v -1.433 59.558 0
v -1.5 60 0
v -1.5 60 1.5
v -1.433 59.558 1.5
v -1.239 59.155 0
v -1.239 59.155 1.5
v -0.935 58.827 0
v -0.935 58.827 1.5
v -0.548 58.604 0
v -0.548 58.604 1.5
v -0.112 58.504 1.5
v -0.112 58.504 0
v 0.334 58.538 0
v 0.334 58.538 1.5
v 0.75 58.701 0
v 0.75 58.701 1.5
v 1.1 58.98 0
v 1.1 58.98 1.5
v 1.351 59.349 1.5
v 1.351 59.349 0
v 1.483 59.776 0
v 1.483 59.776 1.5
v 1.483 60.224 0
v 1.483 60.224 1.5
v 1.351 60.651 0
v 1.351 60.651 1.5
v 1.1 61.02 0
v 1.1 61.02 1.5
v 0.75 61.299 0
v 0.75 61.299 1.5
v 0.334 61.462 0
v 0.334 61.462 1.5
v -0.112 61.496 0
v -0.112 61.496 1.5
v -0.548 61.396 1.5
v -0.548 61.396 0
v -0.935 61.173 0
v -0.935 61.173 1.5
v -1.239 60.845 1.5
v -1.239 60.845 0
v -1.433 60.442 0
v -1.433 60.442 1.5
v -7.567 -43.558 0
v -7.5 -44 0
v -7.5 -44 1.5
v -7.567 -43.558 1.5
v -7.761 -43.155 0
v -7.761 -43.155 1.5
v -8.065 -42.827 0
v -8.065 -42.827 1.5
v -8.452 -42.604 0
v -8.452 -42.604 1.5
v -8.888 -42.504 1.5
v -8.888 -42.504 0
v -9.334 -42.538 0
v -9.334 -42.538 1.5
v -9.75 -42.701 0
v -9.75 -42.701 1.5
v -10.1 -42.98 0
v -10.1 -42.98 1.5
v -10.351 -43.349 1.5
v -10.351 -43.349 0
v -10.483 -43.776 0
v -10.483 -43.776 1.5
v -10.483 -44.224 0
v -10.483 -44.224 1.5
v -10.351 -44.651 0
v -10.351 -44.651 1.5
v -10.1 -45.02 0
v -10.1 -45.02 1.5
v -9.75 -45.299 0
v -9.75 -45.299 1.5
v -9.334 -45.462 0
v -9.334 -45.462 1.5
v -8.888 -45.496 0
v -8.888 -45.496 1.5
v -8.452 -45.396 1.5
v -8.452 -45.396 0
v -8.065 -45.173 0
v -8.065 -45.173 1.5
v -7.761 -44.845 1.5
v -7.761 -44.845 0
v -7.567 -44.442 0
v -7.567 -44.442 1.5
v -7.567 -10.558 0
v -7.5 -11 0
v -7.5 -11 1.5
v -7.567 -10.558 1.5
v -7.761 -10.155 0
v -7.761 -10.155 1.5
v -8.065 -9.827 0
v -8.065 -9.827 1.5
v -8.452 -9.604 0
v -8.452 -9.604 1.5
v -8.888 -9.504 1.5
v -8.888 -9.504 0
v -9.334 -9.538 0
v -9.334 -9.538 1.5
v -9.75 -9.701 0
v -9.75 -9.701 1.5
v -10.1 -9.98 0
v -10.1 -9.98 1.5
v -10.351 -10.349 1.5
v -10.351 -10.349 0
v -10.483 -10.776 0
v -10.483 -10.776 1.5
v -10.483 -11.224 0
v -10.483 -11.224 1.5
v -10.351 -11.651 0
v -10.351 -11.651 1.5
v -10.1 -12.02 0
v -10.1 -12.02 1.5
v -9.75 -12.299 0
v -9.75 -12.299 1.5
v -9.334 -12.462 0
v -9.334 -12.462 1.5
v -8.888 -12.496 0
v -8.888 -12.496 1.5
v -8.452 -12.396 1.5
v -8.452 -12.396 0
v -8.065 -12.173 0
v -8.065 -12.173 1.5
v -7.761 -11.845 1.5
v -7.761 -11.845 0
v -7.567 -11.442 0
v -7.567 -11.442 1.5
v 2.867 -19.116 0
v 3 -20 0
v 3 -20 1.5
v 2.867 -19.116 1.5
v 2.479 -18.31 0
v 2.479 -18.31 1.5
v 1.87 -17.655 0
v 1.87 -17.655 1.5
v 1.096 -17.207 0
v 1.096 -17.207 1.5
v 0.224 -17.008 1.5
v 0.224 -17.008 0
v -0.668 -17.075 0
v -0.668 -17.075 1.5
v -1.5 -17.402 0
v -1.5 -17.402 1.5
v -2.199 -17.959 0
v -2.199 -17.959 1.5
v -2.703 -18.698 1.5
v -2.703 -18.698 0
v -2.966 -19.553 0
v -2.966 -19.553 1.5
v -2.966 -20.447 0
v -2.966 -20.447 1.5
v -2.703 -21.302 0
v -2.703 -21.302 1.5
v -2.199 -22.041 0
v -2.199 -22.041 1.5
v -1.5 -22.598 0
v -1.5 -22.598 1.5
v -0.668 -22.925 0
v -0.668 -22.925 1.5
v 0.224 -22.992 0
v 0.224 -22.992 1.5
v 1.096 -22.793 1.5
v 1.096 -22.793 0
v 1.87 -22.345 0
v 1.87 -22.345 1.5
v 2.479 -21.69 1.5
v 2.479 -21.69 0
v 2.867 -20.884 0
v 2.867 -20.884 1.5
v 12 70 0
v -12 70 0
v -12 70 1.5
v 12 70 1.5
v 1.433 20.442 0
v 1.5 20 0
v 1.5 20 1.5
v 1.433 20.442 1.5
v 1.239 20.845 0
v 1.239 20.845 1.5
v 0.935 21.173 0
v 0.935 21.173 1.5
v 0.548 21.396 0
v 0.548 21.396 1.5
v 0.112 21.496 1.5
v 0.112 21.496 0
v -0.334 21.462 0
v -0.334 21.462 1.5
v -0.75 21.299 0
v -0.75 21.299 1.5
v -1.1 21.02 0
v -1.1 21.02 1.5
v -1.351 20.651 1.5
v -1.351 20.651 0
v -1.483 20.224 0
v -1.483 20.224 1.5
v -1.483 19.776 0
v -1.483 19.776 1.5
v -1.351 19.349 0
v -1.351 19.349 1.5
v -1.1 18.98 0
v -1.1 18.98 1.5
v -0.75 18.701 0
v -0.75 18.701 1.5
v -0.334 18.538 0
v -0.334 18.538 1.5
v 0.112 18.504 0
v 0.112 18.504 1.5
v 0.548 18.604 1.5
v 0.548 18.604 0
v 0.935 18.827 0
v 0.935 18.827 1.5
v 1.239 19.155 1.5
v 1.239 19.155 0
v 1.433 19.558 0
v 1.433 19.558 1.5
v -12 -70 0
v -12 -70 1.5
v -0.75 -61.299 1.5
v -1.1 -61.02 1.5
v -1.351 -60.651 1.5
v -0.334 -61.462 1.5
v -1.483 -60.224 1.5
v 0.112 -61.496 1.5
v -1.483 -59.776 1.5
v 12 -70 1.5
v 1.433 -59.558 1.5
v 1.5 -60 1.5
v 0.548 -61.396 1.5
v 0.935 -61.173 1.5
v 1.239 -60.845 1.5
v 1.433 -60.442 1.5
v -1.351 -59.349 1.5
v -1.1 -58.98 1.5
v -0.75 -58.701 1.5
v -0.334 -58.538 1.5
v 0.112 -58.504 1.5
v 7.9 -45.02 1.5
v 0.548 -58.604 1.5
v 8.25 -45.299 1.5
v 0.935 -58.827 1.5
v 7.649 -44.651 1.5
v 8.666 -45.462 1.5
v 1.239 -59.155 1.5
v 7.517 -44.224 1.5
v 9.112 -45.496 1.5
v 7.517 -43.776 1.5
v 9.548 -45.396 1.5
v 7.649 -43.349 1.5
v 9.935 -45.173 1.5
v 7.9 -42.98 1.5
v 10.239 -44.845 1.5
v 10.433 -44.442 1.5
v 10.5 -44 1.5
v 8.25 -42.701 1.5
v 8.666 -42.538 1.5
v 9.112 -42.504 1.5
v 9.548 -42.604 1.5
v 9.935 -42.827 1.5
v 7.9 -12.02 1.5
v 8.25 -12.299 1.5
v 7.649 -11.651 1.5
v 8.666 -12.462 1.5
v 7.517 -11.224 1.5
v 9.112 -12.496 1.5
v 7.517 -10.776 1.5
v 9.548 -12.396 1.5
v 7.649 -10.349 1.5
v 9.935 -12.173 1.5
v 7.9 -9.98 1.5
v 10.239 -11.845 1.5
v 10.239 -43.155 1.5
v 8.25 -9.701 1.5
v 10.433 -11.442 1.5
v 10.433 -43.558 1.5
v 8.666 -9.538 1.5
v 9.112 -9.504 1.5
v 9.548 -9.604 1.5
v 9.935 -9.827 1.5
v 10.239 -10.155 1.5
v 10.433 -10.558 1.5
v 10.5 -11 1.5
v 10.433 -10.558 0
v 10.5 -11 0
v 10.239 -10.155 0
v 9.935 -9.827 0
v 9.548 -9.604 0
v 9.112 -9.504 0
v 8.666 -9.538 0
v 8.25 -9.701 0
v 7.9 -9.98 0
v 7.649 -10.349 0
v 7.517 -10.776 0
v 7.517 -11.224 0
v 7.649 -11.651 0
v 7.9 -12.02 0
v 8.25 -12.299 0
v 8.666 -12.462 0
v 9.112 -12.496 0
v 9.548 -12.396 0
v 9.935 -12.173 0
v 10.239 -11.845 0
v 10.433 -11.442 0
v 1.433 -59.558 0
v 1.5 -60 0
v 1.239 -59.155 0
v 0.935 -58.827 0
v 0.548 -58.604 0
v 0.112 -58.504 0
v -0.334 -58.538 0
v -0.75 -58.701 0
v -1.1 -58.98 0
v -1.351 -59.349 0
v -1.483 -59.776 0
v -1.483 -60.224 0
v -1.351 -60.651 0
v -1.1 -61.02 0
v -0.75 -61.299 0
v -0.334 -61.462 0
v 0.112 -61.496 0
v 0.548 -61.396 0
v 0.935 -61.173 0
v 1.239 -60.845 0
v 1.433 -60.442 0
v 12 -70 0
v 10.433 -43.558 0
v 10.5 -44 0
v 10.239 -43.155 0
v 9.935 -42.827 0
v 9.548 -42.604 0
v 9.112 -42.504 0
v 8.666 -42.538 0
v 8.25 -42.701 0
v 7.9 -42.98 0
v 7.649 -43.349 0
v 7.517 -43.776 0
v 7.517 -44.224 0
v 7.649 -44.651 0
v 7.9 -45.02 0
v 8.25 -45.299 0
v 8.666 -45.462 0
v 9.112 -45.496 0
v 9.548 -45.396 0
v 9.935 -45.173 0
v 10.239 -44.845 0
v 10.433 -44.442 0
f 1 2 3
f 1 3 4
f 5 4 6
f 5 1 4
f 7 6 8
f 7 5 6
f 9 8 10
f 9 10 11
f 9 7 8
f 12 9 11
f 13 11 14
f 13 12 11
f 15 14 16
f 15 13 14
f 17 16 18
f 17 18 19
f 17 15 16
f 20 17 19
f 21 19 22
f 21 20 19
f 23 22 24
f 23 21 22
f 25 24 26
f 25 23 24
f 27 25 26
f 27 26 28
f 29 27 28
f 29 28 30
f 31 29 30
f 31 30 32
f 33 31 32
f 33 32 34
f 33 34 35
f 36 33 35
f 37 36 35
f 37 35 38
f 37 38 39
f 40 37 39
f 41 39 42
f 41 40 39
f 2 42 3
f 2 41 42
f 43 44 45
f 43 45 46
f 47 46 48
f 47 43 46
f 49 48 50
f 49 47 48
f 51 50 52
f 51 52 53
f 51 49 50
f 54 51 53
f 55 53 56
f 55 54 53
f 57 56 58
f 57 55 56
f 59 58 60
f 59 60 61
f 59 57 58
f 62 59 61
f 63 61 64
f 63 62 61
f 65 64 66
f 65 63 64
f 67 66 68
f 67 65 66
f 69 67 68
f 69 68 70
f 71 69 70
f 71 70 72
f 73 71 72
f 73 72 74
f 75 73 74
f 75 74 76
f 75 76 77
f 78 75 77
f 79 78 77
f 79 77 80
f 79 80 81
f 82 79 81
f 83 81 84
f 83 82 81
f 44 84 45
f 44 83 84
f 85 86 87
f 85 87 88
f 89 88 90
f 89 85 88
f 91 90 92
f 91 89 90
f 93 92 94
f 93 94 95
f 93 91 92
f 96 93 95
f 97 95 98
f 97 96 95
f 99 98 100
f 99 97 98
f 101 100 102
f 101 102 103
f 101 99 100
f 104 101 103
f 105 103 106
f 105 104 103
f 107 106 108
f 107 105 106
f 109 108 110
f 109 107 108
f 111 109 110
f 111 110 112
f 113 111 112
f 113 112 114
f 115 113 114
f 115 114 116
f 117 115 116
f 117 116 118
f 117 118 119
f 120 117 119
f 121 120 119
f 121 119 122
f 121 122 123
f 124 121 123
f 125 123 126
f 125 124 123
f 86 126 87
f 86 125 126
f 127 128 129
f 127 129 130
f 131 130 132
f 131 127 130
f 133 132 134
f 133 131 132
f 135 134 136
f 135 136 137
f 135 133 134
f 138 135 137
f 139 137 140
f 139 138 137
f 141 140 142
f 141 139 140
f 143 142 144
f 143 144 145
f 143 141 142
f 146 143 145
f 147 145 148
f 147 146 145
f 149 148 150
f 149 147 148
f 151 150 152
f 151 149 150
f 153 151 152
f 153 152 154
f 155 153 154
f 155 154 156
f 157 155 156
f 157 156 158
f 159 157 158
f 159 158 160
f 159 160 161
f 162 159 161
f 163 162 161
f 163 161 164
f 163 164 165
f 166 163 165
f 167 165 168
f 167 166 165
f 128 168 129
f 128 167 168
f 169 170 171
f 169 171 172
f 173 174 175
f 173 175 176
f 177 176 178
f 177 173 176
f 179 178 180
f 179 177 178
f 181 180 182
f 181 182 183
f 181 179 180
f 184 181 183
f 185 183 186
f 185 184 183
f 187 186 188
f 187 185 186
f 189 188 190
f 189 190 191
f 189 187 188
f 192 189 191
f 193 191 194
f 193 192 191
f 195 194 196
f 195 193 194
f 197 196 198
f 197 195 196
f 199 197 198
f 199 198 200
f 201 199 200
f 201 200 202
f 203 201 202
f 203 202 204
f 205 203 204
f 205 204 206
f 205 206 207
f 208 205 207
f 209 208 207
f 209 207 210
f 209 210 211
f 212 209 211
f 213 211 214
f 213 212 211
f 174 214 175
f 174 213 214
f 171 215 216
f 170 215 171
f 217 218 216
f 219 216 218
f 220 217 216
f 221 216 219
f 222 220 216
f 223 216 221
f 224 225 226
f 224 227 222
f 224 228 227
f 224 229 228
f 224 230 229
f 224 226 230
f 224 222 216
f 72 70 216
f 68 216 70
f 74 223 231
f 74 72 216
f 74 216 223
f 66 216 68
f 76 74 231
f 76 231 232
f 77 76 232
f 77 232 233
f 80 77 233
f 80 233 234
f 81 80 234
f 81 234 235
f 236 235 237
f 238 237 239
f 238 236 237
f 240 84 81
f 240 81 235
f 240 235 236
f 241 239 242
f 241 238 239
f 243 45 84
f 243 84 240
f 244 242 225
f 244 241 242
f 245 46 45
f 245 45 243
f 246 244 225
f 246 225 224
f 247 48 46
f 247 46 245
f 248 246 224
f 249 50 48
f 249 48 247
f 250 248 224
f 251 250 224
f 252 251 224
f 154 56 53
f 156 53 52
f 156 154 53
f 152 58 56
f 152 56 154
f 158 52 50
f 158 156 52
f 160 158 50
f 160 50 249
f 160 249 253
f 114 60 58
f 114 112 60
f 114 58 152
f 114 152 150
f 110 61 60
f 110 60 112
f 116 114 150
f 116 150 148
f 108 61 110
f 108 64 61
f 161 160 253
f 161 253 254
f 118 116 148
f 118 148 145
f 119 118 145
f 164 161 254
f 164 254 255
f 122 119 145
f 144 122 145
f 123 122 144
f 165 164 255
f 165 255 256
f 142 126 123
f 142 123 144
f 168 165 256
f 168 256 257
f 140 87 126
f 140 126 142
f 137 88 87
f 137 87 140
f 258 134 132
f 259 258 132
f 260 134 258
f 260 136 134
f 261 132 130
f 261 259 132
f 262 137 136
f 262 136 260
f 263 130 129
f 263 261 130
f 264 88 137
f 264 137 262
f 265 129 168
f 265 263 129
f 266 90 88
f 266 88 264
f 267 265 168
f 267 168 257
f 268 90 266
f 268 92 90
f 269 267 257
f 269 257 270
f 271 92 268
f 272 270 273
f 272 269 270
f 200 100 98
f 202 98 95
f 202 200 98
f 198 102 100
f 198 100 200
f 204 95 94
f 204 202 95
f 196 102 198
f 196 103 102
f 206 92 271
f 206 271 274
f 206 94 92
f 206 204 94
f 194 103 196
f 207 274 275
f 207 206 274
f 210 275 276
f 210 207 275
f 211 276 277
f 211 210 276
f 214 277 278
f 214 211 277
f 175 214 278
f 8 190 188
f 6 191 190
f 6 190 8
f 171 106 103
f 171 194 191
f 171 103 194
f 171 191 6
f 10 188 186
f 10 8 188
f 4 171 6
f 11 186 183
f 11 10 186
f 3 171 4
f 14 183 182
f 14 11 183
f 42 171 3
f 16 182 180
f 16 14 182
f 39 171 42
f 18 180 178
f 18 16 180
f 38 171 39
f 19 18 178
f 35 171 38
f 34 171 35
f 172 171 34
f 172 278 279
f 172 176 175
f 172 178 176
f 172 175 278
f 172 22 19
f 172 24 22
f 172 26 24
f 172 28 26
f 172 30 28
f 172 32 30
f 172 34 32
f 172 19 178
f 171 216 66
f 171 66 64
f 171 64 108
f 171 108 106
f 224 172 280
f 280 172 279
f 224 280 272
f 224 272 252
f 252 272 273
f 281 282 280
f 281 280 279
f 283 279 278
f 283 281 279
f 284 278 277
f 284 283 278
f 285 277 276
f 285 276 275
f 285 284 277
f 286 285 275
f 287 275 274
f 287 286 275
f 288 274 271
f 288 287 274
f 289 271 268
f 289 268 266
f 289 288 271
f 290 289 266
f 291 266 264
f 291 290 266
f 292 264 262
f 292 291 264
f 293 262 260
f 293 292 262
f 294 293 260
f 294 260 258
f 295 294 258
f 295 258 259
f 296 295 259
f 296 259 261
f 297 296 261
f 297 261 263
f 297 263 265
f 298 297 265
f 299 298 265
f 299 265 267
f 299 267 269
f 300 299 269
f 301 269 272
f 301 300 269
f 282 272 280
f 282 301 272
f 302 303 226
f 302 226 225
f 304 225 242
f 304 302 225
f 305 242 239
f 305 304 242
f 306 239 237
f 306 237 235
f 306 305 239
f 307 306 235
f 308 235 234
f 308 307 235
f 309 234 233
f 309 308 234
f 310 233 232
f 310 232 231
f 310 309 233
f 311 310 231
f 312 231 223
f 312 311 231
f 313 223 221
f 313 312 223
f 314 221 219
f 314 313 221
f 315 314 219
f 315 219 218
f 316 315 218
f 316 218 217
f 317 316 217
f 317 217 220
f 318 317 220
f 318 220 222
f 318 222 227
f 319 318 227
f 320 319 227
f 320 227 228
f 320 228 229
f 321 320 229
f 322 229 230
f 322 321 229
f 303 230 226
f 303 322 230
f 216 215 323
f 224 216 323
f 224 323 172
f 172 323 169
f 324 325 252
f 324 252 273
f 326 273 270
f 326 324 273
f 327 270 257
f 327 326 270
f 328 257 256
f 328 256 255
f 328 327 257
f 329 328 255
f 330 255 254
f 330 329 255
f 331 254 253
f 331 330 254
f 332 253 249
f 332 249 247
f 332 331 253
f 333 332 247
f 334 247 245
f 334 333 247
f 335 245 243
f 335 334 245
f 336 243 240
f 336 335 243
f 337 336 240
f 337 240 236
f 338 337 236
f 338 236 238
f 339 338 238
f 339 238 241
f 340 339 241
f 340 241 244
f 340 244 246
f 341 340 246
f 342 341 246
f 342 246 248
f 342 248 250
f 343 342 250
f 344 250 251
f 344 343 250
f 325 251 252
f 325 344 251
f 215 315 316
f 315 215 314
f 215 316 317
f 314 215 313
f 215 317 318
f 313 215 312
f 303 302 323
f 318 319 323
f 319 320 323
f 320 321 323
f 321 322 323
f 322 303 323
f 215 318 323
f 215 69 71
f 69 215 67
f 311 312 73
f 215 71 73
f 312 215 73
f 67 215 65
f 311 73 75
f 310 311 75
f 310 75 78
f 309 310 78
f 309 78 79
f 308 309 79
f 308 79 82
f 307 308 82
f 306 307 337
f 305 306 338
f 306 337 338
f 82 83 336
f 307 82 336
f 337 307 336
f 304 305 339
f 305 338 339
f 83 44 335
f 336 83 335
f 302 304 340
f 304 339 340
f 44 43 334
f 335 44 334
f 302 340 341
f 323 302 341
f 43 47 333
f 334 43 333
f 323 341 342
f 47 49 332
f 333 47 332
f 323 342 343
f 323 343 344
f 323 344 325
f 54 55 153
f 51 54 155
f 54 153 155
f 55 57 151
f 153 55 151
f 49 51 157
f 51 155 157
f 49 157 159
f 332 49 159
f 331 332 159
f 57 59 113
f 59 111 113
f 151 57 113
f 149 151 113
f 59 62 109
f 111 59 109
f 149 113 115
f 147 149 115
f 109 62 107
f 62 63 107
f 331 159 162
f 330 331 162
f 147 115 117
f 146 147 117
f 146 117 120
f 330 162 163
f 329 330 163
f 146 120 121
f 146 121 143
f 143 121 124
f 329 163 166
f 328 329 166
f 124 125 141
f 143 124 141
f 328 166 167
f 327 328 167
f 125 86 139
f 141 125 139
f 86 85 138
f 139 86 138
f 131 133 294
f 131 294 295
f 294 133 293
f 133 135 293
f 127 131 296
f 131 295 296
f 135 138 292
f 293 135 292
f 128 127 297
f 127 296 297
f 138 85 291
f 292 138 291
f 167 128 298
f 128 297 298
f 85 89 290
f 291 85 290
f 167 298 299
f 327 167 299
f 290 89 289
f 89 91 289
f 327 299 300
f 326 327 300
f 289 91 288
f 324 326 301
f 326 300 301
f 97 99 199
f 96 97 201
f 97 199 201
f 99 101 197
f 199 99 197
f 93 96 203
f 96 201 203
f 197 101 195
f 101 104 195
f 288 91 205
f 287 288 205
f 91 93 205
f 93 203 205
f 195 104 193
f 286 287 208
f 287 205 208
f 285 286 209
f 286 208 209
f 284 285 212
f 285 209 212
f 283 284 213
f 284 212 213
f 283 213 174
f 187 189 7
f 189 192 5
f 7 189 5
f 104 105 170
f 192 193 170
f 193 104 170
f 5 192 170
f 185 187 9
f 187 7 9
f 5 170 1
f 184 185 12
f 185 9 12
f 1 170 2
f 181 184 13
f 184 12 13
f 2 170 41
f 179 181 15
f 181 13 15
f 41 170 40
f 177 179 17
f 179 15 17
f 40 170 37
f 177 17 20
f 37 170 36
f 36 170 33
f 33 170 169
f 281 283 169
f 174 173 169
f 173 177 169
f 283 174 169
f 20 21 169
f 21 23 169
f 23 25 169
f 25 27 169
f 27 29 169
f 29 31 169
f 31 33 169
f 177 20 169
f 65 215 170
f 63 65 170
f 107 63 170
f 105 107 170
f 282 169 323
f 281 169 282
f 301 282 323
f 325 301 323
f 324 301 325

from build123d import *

# Parameters (mm, degrees)
SKETCH_1_W      = 24
SKETCH_1_H      = 140
SKETCH_1_R      = 1.5
SKETCH_1_R_2    = 3
EXTRUDE_1_DEPTH = 1.5


with BuildPart() as part:
    # 草图1 → 凸台-拉伸1 (new body)
    with BuildSketch(Plane.XY):
        Rectangle(SKETCH_1_W, SKETCH_1_H)
        with Locations((0, 20)):
            Circle(SKETCH_1_R, mode=Mode.SUBTRACT)
        with Locations((0, -60)):
            Circle(SKETCH_1_R, mode=Mode.SUBTRACT)
        with Locations(Location((0, 60, 0), (0, 0, 180))):
            Circle(SKETCH_1_R, mode=Mode.SUBTRACT)
        with Locations((-9, -11)):
            Circle(SKETCH_1_R, mode=Mode.SUBTRACT)
        with Locations((9, -11)):
            Circle(SKETCH_1_R, mode=Mode.SUBTRACT)
        with Locations((9, -44)):
            Circle(SKETCH_1_R, mode=Mode.SUBTRACT)
        with Locations((-9, -44)):
            Circle(SKETCH_1_R, mode=Mode.SUBTRACT)
        with Locations((0, -20)):
            Circle(SKETCH_1_R_2, mode=Mode.SUBTRACT)
    extrude(amount=EXTRUDE_1_DEPTH)


solid = part.part
